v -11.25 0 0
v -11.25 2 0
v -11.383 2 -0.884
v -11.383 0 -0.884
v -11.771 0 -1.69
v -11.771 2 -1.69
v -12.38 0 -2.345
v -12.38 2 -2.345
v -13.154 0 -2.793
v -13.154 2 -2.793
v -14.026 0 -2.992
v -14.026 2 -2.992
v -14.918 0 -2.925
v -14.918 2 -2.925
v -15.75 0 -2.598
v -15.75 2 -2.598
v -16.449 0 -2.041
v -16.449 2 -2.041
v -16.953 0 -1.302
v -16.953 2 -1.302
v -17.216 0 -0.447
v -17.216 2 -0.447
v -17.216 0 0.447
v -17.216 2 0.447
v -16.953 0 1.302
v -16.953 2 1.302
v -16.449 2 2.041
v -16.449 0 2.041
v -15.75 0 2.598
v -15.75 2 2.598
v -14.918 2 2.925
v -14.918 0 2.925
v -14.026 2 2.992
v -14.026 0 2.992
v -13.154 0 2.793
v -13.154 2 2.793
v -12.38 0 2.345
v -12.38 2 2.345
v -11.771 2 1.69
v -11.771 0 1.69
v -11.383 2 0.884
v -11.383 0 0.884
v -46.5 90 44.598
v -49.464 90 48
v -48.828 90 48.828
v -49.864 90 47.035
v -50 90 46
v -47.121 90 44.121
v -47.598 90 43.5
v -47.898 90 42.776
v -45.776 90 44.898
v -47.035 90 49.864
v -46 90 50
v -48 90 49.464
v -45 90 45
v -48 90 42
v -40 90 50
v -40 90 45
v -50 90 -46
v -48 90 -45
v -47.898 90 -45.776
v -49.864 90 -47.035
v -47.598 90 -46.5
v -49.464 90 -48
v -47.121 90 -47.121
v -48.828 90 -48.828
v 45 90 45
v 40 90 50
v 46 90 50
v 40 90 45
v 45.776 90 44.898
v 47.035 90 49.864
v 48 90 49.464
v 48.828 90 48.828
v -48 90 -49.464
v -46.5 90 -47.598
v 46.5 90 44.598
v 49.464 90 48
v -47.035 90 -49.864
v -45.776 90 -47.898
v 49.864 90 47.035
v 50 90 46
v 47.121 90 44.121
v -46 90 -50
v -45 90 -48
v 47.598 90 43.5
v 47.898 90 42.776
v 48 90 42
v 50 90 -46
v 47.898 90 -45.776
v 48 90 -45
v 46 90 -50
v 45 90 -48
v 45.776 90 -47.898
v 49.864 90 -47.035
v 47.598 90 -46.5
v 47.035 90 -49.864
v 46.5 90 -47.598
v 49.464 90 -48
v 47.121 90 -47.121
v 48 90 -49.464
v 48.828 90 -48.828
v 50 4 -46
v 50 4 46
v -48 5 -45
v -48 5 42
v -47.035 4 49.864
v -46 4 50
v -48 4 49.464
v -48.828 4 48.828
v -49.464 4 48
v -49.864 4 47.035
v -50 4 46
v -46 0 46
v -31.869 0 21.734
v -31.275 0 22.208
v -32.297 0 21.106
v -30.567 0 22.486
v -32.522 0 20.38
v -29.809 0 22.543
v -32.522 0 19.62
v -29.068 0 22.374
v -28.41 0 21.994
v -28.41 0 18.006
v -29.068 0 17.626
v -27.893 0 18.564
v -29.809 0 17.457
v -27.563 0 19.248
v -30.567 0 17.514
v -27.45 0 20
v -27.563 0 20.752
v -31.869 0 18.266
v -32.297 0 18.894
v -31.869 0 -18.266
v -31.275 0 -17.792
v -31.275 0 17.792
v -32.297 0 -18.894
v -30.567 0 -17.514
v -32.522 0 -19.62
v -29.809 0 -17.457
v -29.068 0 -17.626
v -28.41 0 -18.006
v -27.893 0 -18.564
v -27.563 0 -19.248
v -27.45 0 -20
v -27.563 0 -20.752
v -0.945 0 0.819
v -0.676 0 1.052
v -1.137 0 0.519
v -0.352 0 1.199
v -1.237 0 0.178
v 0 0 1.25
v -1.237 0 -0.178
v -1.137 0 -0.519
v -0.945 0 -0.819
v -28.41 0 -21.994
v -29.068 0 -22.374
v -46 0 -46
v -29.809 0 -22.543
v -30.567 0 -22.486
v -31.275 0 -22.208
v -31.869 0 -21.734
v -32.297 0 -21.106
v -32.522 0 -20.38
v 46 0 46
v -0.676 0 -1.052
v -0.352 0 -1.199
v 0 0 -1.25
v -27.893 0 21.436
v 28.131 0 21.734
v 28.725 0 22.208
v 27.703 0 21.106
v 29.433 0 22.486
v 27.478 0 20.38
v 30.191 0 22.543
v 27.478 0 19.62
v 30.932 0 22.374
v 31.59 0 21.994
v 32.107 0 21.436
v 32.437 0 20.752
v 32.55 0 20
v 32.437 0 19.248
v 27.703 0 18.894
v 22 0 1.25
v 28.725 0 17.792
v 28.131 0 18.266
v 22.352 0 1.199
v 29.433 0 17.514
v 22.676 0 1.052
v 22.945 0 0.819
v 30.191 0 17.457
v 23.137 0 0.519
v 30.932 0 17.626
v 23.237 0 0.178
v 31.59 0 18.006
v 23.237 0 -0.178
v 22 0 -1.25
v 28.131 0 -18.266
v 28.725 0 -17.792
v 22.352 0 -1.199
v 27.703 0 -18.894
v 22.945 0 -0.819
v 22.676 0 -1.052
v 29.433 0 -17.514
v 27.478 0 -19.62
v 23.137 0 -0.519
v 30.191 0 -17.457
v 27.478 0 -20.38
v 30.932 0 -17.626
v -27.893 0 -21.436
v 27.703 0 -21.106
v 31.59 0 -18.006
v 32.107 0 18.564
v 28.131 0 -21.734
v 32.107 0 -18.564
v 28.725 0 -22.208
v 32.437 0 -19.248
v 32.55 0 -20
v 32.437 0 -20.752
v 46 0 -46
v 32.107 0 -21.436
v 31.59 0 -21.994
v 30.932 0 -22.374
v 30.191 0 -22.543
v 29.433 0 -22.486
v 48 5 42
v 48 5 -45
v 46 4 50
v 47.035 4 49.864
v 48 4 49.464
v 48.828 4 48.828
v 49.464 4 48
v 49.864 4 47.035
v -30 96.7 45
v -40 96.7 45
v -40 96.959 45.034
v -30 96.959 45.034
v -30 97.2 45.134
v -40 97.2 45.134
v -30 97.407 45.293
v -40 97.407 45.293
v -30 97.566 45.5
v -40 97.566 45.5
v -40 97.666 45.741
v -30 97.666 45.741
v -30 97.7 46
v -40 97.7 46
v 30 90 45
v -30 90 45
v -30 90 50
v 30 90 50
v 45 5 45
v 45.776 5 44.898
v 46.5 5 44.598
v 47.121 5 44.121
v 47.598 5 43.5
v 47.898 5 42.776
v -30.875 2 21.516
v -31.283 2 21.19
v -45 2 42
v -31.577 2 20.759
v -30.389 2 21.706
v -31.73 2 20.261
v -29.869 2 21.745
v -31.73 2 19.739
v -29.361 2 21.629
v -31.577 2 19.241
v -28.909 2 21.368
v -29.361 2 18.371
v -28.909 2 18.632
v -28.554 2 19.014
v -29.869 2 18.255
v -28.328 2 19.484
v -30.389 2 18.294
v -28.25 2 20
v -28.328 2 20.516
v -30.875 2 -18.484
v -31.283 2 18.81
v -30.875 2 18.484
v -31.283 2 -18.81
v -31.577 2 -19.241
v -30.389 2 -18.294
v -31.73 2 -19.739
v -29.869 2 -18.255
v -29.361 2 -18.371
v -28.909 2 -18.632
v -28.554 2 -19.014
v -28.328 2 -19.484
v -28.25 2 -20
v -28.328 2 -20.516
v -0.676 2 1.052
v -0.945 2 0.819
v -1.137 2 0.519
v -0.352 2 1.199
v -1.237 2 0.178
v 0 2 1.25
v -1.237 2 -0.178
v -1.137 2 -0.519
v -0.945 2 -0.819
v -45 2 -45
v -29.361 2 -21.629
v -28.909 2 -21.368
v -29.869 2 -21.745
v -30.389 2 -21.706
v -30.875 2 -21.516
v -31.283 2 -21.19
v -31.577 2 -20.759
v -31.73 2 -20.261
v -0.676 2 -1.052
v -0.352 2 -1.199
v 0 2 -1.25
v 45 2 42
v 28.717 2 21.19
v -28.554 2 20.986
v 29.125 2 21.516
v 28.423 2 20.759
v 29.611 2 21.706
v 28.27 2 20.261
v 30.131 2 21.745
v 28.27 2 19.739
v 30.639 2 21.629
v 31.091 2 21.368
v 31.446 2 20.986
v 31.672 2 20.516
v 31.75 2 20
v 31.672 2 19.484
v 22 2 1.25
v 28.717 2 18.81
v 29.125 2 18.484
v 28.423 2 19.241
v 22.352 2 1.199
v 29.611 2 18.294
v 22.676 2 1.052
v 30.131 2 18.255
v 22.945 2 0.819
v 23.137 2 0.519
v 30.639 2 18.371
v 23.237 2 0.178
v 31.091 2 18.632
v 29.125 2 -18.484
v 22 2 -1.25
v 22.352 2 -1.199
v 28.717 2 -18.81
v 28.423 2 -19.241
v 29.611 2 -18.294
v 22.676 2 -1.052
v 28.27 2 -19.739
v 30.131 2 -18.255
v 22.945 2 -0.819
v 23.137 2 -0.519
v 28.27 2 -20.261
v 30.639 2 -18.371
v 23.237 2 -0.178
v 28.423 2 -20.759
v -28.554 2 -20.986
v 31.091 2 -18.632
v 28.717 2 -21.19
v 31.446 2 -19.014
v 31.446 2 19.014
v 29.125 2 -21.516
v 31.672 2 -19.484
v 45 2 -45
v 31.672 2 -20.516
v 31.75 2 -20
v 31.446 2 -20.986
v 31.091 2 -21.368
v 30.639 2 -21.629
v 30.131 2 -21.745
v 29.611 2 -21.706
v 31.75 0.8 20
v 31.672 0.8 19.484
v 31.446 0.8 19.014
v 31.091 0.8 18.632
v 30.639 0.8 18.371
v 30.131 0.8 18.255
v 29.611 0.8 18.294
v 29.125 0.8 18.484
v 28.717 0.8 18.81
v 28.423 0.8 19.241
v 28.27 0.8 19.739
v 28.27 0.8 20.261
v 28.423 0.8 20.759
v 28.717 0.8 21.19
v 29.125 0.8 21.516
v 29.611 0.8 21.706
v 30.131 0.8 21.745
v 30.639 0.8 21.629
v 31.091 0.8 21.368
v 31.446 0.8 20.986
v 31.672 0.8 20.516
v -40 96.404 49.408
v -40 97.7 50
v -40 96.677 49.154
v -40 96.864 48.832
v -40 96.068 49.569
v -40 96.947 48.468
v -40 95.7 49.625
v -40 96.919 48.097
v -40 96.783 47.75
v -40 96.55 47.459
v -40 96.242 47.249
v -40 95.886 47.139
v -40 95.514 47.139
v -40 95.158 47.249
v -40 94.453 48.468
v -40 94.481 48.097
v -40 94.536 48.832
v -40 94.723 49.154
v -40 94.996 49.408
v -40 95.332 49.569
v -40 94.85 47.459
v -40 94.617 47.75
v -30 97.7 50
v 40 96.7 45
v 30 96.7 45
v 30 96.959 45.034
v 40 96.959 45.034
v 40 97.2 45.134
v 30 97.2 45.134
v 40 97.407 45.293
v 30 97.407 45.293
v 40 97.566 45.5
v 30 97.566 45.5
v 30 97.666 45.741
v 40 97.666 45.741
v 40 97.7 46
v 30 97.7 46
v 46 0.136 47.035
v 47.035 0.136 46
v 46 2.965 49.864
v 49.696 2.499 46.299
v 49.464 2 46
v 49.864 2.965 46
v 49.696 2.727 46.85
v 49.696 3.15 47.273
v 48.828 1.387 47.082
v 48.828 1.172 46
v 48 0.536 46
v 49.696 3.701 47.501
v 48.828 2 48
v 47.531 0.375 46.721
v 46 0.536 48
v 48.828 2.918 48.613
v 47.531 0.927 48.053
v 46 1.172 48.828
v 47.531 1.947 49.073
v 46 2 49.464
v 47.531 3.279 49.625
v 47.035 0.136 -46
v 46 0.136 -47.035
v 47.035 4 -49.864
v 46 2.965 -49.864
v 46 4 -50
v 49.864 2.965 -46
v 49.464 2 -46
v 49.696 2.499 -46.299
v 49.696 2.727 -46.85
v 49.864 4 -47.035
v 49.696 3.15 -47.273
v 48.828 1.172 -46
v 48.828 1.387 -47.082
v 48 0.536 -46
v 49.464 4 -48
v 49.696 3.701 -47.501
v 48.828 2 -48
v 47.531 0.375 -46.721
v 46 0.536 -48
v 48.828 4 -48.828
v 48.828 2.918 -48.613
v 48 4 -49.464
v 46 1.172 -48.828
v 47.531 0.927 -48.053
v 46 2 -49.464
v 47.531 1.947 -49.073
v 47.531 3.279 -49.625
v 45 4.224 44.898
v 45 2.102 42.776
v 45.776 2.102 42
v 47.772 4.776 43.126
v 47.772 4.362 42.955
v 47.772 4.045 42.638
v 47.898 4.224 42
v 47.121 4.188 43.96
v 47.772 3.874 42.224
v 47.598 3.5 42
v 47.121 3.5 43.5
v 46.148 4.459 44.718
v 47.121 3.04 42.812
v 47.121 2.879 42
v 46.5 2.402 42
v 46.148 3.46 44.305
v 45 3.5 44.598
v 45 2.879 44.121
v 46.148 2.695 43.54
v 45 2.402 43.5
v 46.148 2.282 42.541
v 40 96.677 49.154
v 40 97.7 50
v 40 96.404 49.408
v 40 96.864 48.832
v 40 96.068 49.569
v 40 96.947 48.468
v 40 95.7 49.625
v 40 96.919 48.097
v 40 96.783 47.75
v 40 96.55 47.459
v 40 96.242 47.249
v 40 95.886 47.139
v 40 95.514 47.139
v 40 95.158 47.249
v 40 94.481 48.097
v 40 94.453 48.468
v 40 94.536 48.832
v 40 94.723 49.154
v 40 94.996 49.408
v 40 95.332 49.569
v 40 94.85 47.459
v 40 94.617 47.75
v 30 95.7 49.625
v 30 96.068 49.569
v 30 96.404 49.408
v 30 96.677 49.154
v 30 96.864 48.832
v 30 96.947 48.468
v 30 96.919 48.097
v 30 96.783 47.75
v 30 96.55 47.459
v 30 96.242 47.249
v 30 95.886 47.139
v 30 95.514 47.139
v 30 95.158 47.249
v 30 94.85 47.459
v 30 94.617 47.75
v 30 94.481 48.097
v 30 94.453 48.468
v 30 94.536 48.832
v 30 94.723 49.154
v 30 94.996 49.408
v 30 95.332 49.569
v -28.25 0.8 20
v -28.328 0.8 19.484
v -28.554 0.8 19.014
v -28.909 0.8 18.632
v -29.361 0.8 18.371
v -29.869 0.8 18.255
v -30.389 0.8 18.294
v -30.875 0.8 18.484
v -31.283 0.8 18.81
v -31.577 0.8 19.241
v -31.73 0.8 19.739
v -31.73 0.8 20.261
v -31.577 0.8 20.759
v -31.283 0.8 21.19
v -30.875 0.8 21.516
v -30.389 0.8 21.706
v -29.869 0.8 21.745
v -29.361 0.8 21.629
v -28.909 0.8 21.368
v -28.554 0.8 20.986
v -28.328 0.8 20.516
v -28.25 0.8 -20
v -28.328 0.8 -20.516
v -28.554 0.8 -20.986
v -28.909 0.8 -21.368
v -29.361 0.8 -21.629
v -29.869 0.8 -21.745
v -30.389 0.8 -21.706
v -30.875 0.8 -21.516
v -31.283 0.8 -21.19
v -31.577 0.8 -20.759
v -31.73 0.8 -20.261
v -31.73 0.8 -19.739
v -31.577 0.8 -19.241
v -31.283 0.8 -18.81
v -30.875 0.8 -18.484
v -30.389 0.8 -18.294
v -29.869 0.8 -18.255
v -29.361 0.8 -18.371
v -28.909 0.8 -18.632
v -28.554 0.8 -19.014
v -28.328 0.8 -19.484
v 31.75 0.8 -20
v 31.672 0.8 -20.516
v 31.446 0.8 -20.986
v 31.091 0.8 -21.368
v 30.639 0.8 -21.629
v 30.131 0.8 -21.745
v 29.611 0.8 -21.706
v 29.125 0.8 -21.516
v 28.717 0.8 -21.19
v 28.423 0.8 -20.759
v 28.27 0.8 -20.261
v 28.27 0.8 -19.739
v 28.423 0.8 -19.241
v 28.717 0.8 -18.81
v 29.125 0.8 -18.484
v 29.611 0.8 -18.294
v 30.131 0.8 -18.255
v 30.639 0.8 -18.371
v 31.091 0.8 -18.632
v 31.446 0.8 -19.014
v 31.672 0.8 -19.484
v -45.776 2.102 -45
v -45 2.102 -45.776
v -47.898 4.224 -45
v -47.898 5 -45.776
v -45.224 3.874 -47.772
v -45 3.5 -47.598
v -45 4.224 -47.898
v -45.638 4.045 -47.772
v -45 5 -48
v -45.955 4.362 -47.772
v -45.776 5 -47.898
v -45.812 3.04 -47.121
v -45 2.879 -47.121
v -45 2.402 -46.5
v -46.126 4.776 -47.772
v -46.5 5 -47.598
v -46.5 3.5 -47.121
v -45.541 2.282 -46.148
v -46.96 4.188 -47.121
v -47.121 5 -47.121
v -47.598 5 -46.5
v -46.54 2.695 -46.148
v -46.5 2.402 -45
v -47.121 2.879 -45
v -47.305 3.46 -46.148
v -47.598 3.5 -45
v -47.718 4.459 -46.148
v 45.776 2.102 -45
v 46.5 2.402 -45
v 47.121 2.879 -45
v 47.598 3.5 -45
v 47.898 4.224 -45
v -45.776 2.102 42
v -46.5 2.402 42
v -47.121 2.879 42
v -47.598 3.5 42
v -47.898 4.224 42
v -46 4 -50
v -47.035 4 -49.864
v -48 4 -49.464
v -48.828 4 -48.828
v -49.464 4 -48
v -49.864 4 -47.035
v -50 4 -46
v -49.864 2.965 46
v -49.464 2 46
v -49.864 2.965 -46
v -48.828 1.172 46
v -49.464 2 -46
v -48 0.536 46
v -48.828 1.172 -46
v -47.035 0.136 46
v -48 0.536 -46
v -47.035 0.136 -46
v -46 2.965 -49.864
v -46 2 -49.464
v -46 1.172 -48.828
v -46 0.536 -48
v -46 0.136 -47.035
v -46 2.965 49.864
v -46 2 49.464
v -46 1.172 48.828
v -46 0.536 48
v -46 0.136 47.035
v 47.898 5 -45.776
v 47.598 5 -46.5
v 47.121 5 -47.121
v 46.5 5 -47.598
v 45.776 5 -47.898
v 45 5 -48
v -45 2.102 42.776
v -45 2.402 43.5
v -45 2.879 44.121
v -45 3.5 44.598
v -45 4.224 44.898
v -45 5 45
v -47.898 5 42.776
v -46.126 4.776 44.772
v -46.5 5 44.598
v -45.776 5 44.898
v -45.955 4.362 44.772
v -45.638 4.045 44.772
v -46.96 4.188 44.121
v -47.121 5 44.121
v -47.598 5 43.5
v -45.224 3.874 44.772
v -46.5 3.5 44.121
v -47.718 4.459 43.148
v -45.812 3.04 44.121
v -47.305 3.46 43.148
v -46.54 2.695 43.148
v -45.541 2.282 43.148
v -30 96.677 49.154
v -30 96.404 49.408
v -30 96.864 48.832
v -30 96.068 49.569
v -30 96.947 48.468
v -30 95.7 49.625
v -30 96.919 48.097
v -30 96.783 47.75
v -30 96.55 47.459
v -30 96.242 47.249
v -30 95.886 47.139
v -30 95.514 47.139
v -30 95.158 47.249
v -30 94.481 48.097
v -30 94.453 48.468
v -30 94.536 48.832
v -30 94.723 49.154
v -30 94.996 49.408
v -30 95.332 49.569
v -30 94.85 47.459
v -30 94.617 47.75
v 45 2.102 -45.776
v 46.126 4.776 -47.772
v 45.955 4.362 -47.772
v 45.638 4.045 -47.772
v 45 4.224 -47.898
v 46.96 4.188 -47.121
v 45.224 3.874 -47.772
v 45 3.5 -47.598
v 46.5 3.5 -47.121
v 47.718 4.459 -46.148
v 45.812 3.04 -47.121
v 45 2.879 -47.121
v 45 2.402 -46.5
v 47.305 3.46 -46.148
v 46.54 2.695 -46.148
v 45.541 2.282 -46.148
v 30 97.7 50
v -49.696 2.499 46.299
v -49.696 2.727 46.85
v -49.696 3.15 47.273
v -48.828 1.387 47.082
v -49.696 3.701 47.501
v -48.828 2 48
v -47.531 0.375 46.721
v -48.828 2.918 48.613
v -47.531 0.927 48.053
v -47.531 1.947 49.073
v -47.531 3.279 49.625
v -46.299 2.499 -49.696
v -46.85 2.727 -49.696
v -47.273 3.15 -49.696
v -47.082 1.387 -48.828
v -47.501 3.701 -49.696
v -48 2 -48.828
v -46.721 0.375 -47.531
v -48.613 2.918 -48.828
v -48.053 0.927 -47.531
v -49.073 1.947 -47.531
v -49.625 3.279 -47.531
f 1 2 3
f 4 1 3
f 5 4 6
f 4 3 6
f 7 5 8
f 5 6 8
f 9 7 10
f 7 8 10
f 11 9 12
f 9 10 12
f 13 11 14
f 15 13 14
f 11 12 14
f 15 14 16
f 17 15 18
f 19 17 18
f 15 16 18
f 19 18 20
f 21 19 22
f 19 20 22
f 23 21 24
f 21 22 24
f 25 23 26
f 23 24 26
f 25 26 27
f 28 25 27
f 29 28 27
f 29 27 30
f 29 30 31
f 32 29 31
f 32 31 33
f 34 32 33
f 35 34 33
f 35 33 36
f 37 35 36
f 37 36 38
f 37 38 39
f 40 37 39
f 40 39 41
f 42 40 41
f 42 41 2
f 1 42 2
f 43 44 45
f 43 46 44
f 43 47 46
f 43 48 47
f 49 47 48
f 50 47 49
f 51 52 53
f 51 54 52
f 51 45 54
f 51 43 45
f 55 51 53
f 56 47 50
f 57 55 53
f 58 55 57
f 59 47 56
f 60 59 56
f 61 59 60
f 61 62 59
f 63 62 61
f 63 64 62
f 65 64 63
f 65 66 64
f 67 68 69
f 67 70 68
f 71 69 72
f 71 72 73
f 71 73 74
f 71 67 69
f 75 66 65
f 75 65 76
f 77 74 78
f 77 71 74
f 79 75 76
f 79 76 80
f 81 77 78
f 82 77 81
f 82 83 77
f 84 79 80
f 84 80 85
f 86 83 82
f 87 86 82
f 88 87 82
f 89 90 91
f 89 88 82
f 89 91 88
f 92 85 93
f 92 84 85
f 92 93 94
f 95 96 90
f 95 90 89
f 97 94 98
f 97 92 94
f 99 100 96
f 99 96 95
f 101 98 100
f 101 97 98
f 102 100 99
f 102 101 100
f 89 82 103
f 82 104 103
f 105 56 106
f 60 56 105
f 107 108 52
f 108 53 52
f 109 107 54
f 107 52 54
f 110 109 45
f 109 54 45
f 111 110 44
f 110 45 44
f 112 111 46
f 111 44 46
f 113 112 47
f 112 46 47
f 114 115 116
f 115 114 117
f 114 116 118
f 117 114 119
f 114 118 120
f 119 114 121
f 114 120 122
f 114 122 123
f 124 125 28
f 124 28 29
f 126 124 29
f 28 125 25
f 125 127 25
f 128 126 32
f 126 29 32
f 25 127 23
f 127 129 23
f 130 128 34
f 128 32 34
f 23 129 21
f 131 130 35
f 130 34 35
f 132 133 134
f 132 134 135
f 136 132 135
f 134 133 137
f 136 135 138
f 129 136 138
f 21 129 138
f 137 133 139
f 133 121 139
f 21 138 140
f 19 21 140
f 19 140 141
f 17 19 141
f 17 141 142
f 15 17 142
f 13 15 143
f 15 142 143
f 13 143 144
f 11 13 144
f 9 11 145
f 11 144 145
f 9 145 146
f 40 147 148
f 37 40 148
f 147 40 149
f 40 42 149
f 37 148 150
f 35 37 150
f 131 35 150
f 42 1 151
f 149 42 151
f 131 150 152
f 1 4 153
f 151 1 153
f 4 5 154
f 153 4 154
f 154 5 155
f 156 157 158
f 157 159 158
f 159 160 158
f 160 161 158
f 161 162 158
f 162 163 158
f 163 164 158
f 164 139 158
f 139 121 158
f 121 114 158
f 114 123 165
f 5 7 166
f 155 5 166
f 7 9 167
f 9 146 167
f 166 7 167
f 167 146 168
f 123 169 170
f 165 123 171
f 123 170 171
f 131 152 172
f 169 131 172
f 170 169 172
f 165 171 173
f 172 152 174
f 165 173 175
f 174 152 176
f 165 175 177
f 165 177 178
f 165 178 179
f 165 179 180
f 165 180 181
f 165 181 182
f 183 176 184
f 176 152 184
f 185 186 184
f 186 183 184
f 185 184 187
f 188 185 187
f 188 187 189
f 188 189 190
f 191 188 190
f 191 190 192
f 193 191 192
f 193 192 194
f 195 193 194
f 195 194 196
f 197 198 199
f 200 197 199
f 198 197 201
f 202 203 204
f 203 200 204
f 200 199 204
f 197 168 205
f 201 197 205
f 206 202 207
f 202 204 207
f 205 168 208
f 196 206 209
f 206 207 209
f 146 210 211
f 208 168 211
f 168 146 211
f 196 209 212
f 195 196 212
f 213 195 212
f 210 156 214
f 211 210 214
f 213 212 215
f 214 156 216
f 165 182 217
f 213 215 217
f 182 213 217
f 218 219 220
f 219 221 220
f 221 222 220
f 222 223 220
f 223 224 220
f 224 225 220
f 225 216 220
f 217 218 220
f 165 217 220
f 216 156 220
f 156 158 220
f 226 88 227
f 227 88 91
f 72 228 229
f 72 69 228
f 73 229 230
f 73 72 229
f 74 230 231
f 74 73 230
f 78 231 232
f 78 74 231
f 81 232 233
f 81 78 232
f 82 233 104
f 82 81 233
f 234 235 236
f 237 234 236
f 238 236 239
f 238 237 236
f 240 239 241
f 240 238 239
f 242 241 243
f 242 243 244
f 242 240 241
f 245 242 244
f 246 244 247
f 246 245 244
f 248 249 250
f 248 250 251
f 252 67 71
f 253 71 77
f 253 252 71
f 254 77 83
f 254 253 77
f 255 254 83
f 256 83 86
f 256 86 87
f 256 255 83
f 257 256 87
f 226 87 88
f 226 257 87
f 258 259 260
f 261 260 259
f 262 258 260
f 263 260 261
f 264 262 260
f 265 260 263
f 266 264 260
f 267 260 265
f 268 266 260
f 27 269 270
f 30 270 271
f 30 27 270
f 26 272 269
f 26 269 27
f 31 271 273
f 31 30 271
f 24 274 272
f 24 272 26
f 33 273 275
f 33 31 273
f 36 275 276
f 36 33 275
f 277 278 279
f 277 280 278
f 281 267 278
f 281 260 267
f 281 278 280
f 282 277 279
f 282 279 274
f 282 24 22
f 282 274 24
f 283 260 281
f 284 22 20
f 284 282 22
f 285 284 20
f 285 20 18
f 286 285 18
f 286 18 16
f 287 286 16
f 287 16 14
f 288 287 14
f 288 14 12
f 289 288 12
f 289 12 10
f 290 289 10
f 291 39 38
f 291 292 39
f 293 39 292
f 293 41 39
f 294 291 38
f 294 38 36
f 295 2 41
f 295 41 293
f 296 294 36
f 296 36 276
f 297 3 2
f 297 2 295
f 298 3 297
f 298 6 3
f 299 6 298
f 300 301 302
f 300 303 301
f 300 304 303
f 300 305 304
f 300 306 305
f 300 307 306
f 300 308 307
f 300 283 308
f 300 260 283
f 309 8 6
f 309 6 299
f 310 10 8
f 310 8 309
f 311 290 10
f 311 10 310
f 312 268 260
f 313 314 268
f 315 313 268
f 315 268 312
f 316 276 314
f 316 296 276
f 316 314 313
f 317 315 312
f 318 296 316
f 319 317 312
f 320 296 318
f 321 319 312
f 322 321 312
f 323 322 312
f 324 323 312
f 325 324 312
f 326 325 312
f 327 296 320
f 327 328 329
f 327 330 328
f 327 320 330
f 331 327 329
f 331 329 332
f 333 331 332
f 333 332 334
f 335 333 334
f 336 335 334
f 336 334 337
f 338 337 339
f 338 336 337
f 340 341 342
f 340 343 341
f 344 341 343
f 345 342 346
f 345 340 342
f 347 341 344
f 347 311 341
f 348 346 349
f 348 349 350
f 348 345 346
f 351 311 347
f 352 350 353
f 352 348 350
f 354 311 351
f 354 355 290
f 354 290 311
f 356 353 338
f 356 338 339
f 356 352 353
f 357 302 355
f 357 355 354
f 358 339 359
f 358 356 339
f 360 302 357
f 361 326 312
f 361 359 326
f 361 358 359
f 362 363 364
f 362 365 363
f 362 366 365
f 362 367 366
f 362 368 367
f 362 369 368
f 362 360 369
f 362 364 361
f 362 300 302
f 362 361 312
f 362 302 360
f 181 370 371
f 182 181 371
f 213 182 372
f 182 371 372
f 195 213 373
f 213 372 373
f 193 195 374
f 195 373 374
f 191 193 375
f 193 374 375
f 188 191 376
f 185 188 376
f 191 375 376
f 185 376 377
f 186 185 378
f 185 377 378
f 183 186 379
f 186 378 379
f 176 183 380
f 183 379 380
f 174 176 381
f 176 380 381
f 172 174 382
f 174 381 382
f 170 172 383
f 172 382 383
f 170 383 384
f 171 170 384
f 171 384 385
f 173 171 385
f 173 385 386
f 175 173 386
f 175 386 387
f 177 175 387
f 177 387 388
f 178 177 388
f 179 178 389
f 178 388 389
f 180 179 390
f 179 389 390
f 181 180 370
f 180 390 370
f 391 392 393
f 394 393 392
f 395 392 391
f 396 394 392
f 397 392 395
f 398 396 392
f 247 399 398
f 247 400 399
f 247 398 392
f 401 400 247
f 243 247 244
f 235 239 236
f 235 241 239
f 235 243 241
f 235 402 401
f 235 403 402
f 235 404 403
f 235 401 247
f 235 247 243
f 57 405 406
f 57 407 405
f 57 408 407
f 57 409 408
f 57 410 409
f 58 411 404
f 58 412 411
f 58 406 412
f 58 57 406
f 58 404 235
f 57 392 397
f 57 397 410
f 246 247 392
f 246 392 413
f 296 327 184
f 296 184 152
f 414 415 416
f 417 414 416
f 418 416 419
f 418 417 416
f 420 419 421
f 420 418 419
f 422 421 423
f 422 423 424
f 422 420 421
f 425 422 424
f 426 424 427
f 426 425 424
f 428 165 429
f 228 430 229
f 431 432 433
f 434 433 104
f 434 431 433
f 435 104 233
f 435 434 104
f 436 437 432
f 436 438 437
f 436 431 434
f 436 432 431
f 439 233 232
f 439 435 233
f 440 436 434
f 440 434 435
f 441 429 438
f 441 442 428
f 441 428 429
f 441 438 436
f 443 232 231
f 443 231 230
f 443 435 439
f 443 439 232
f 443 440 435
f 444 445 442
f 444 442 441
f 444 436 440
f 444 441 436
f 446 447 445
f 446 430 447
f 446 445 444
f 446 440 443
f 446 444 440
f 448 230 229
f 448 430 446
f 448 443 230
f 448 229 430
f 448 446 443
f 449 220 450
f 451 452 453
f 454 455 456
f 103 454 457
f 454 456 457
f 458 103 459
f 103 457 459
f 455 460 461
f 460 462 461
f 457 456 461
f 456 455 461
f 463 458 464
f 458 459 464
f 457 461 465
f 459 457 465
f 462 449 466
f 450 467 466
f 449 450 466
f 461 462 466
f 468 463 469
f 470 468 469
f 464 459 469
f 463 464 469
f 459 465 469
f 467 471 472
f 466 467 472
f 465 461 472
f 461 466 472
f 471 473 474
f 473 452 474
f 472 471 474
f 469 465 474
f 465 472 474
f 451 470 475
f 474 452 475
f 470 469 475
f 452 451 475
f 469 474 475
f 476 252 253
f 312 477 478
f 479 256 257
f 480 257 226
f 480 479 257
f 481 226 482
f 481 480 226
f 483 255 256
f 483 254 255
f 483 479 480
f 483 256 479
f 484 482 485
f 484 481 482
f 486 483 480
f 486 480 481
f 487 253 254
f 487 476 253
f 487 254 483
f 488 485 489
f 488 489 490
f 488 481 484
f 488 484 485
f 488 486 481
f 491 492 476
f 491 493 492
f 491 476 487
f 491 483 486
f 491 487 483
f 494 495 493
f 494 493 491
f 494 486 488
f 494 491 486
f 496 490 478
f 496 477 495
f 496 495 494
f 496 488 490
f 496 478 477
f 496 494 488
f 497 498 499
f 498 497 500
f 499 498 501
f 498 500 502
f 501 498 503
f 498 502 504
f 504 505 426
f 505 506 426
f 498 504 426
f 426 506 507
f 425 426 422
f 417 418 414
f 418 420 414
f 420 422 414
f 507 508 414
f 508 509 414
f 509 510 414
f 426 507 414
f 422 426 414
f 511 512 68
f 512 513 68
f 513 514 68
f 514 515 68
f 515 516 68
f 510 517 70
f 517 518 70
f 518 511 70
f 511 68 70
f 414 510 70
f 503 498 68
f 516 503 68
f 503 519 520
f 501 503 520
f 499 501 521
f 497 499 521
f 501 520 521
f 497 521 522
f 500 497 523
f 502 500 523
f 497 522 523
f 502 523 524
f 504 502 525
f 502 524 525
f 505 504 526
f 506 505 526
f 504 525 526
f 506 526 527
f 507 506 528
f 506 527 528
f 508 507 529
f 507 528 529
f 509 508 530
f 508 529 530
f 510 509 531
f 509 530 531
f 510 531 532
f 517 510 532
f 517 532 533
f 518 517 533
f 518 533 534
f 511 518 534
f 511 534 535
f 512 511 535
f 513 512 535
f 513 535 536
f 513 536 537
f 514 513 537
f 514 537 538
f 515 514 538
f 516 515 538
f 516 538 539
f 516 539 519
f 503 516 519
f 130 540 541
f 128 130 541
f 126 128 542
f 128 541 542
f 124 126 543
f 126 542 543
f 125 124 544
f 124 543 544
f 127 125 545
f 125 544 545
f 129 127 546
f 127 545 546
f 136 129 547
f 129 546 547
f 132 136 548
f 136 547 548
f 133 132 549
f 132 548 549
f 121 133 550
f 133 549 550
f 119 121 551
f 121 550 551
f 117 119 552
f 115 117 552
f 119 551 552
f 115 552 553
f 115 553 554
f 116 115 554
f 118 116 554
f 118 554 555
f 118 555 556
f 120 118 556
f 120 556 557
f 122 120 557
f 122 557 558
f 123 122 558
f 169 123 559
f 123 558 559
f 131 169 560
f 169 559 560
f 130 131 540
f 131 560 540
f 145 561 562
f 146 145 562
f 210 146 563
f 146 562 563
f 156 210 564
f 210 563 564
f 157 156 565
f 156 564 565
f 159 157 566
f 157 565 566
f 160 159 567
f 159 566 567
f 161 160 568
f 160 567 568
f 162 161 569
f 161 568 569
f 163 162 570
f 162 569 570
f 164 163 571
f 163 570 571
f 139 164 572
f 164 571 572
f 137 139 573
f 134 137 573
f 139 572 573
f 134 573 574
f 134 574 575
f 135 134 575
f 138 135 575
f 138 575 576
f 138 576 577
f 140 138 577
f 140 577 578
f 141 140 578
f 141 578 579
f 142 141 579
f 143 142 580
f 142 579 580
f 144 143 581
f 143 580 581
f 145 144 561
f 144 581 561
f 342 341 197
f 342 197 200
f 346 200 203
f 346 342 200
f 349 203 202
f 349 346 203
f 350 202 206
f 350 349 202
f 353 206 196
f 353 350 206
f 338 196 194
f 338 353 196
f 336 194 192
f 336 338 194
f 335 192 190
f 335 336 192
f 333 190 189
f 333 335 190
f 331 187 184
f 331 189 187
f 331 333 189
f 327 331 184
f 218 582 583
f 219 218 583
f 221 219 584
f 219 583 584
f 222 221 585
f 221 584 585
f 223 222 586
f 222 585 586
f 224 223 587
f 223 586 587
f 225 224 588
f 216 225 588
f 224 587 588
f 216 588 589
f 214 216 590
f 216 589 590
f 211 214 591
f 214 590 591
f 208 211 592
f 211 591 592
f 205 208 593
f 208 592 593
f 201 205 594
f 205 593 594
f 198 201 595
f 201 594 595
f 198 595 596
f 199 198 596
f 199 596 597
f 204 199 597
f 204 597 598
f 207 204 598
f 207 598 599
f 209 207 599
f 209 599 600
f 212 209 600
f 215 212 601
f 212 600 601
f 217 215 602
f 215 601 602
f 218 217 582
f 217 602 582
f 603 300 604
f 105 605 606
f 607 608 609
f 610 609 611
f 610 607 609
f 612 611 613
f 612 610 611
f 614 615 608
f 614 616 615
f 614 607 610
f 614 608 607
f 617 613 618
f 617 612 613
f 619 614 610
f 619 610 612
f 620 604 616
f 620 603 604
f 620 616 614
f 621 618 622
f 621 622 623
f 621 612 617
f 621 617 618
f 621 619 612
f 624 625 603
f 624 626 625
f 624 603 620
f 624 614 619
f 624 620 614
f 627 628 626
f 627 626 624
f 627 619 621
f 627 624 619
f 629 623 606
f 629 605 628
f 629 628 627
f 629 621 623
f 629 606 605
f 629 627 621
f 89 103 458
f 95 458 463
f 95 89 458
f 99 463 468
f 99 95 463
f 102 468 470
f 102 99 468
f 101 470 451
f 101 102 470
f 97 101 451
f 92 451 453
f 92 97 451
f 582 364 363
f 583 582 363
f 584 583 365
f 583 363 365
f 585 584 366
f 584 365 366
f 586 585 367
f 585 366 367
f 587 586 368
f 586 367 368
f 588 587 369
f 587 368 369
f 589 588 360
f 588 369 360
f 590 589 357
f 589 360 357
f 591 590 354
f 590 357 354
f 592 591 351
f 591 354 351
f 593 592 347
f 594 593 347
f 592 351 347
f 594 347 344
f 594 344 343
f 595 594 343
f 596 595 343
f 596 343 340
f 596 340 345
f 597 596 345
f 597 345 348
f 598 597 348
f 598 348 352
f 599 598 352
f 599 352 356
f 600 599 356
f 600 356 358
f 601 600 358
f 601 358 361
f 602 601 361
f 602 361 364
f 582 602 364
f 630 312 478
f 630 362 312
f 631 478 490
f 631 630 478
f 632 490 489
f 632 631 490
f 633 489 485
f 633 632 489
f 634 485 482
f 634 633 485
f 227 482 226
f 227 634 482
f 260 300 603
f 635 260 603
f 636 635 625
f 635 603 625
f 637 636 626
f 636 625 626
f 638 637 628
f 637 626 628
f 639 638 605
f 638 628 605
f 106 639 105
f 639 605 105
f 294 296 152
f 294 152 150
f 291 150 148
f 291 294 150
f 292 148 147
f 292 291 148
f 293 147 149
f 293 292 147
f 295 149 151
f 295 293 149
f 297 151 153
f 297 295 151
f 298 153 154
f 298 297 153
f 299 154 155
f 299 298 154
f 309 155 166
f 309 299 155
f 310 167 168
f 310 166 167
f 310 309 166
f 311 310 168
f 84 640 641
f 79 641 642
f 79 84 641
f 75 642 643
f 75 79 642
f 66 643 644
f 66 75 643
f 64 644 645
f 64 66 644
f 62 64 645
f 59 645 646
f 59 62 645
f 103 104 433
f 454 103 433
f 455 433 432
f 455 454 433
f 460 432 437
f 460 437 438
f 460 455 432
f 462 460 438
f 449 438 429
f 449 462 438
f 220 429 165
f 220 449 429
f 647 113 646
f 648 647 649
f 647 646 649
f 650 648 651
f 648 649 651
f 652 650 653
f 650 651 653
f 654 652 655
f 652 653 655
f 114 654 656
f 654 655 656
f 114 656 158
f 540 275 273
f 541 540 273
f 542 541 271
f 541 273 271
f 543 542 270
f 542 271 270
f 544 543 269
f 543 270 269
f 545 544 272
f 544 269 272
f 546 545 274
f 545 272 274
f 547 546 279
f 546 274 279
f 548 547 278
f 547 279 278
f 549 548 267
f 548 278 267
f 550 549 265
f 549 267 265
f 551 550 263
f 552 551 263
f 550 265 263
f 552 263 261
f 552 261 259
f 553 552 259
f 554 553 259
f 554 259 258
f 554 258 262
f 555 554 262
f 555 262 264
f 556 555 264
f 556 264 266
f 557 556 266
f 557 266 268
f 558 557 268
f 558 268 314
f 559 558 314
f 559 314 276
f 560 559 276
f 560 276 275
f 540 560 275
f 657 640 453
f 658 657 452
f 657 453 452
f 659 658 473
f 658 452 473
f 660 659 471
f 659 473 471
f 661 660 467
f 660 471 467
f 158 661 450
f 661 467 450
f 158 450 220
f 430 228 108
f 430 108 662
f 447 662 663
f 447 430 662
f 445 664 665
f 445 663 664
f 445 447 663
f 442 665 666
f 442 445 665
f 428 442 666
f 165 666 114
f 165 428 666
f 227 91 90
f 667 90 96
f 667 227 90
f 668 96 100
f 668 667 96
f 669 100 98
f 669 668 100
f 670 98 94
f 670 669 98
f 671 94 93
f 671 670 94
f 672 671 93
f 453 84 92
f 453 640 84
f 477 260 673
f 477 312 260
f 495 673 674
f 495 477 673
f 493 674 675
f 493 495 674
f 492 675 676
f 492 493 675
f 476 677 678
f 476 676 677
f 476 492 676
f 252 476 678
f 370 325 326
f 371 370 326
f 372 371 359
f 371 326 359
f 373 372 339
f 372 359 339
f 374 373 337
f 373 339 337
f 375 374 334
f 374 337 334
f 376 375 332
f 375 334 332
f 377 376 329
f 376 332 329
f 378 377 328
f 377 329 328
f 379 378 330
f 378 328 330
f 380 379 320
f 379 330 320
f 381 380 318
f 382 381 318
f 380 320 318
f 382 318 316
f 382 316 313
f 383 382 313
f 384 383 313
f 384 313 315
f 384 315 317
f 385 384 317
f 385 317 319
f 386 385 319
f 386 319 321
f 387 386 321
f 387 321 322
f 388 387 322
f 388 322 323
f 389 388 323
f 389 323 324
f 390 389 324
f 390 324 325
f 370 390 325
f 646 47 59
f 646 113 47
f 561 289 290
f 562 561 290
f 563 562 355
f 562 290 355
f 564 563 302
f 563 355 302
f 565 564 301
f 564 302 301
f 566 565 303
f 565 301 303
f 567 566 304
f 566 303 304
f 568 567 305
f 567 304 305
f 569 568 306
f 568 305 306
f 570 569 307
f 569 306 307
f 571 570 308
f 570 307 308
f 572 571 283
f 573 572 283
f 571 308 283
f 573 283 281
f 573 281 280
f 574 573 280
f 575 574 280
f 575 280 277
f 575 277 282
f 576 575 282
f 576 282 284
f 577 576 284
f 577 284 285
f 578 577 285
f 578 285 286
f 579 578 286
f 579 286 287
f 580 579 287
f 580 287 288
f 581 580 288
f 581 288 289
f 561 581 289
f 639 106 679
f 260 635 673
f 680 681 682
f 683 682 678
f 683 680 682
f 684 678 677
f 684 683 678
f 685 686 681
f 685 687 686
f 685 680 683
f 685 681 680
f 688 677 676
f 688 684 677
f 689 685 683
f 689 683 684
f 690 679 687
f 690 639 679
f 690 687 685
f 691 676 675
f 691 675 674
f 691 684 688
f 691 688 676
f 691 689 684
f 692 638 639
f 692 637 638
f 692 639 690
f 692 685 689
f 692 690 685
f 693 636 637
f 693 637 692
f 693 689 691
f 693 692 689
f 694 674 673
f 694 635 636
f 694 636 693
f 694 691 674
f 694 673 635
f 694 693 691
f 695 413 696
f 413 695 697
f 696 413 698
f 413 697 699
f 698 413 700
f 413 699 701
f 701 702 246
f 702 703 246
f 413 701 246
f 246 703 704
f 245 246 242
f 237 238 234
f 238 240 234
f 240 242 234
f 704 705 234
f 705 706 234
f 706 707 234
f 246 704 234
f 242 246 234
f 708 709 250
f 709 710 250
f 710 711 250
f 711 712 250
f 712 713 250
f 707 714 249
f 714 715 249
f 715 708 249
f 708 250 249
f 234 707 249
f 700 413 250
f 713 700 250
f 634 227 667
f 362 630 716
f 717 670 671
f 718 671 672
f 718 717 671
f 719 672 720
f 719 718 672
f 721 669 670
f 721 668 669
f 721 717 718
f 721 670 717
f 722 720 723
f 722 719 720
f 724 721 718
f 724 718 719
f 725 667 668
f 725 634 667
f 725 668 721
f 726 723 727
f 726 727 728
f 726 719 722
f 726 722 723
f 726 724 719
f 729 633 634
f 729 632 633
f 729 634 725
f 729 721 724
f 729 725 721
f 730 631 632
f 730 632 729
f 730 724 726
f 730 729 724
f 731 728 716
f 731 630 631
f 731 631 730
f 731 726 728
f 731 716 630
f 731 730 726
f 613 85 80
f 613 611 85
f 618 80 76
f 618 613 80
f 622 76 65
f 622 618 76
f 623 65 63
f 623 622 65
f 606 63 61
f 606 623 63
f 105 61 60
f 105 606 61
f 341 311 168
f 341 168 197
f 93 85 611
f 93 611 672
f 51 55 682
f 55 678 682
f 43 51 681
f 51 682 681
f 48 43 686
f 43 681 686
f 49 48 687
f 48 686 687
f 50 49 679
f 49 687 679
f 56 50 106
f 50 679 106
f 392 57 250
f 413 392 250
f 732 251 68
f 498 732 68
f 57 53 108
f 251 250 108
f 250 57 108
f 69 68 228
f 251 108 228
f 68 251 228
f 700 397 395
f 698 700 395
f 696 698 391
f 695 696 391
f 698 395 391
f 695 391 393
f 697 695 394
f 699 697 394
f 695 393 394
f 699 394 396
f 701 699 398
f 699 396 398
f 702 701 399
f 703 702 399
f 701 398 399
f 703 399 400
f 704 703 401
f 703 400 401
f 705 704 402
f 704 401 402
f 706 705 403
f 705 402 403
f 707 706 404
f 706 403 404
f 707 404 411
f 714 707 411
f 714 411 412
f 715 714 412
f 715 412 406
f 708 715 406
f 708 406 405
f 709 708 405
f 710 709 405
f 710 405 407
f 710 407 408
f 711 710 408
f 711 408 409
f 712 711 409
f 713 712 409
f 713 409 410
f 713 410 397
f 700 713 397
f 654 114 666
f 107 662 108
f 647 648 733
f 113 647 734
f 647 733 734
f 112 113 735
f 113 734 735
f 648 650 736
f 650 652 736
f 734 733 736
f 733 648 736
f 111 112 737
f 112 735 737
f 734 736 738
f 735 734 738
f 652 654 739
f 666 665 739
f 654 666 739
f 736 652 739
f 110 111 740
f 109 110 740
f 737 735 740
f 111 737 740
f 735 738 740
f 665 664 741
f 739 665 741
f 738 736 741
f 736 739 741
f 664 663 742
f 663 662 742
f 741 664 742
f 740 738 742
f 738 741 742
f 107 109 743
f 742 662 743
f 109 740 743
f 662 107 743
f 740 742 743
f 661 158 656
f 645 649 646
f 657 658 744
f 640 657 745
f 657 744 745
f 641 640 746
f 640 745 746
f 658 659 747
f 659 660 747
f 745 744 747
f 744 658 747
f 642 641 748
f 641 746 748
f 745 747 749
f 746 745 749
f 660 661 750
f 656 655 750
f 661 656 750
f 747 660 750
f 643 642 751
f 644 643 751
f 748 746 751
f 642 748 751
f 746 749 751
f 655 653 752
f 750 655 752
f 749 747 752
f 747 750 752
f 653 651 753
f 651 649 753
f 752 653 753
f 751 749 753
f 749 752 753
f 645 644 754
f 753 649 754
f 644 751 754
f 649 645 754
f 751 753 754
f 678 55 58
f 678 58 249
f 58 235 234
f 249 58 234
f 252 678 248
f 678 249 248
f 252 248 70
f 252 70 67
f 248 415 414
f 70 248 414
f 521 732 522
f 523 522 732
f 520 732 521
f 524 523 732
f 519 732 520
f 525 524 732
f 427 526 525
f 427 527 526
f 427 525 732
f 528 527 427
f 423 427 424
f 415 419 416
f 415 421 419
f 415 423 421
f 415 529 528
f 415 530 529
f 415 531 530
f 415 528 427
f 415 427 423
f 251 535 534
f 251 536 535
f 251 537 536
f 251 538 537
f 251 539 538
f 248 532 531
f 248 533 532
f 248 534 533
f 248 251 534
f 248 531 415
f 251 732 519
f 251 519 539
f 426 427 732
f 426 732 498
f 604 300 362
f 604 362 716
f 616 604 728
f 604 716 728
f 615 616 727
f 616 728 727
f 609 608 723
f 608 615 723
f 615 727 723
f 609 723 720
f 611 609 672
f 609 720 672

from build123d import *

# Parameters (mm, degrees)
SKETCH1_W           = 100
SKETCH1_H           = 100
BOSS_EXTRUDE1_DEPTH = 90
SKETCH2_W           = 96
SKETCH2_H           = 93
CUT_EXTRUDE1_DEPTH  = 88
CUT_EXTRUDE2_REACH  = 4
SKETCH3_R           = 3
SKETCH3_R_2         = 1.75
CHAMFER1_SIZE       = 0.8
SKETCH4_W           = 10
SKETCH4_H           = 5
BOSS_EXTRUDE2_DEPTH = 7.7
SKETCH5_R           = 1.25
CUT_EXTRUDE3_DEPTH  = 91
FILLET1_R           = 3
FILLET2_R           = 4
FILLET3_R           = 1


with BuildPart() as part:
    # Sketch1 → Boss-Extrude1 (new body)
    with BuildSketch(Plane(origin=(0, 0, 0), x_dir=(1, 0, 0), z_dir=(0, 1, 0))):
        Rectangle(SKETCH1_W, SKETCH1_H)
    extrude(amount=BOSS_EXTRUDE1_DEPTH)

    # Sketch2 → Cut-Extrude1 (cut)
    with BuildSketch(Plane(origin=(0, 90, 0), x_dir=(1, 0, 0), z_dir=(0, 1, 0))):
        with Locations((0, 1.5)):
            Rectangle(SKETCH2_W, SKETCH2_H)
    extrude(amount=-CUT_EXTRUDE1_DEPTH, mode=Mode.SUBTRACT)

    # Sketch3 → Cut-Extrude2 (cut, up to next)
    with BuildSketch(Plane(origin=(0, 2, 0), x_dir=(1, 0, 0), z_dir=(0, 1, 0)), mode=Mode.PRIVATE) as cut_extrude2_sk1:
        with Locations((-14.25, 0)):
            Circle(SKETCH3_R)
    cut_extrude2_tool1 = extrude(cut_extrude2_sk1.sketch, amount=-CUT_EXTRUDE2_REACH, mode=Mode.PRIVATE) & part.part
    add(cut_extrude2_tool1.solids().sort_by_distance((-14.25, 2, 0))[0], mode=Mode.SUBTRACT)
    # Sketch3 → Cut-Extrude2 (cut, up to next)
    with BuildSketch(Plane(origin=(0, 2, 0), x_dir=(1, 0, 0), z_dir=(0, 1, 0)), mode=Mode.PRIVATE) as cut_extrude2_sk2:
        with Locations((-30, 20)):
            Circle(SKETCH3_R_2)
    cut_extrude2_tool2 = extrude(cut_extrude2_sk2.sketch, amount=-CUT_EXTRUDE2_REACH, mode=Mode.PRIVATE) & part.part
    add(cut_extrude2_tool2.solids().sort_by_distance((-30, 2, -20))[0], mode=Mode.SUBTRACT)
    # Sketch3 → Cut-Extrude2 (cut, up to next)
    with BuildSketch(Plane(origin=(0, 2, 0), x_dir=(1, 0, 0), z_dir=(0, 1, 0)), mode=Mode.PRIVATE) as cut_extrude2_sk3:
        with Locations((-30, -20)):
            Circle(SKETCH3_R_2)
    cut_extrude2_tool3 = extrude(cut_extrude2_sk3.sketch, amount=-CUT_EXTRUDE2_REACH, mode=Mode.PRIVATE) & part.part
    add(cut_extrude2_tool3.solids().sort_by_distance((-30, 2, 20))[0], mode=Mode.SUBTRACT)
    # Sketch3 → Cut-Extrude2 (cut, up to next)
    with BuildSketch(Plane(origin=(0, 2, 0), x_dir=(1, 0, 0), z_dir=(0, 1, 0)), mode=Mode.PRIVATE) as cut_extrude2_sk4:
        with Locations((30, -20)):
            Circle(SKETCH3_R_2)
    cut_extrude2_tool4 = extrude(cut_extrude2_sk4.sketch, amount=-CUT_EXTRUDE2_REACH, mode=Mode.PRIVATE) & part.part
    add(cut_extrude2_tool4.solids().sort_by_distance((30, 2, 20))[0], mode=Mode.SUBTRACT)
    # Sketch3 → Cut-Extrude2 (cut, up to next)
    with BuildSketch(Plane(origin=(0, 2, 0), x_dir=(1, 0, 0), z_dir=(0, 1, 0)), mode=Mode.PRIVATE) as cut_extrude2_sk5:
        with Locations((30, 20)):
            Circle(SKETCH3_R_2)
    cut_extrude2_tool5 = extrude(cut_extrude2_sk5.sketch, amount=-CUT_EXTRUDE2_REACH, mode=Mode.PRIVATE) & part.part
    add(cut_extrude2_tool5.solids().sort_by_distance((30, 2, -20))[0], mode=Mode.SUBTRACT)
    # Sketch3 → Cut-Extrude2 (cut, up to next)
    with BuildSketch(Plane(origin=(0, 2, 0), x_dir=(1, 0, 0), z_dir=(0, 1, 0)), mode=Mode.PRIVATE) as cut_extrude2_sk6:
        with BuildLine():
            Line((0, 1.25), (22, 1.25))
            ThreePointArc((22, 1.25), (23.25, 0), (22, -1.25))
            Line((22, -1.25), (0, -1.25))
            ThreePointArc((0, -1.25), (-1.25, 0), (0, 1.25))
        make_face()
    cut_extrude2_tool6 = extrude(cut_extrude2_sk6.sketch, amount=-CUT_EXTRUDE2_REACH, mode=Mode.PRIVATE) & part.part
    add(cut_extrude2_tool6.solids().sort_by_distance((11, 2, 0))[0], mode=Mode.SUBTRACT)

    # Chamfer1
    chamfer1_edges = [part.edges().sort_by_distance(p)[0] for p in [
        (-31.75, 0, -20),
        (-31.75, 0, 20),
        (28.25, 0, 20),
        (28.25, 0, -20),
    ]]
    chamfer(chamfer1_edges, length=CHAMFER1_SIZE)

    # Sketch4 → Boss-Extrude2 (add)
    with BuildSketch(Plane(origin=(0, 90, 0), x_dir=(1, 0, 0), z_dir=(0, 1, 0))):
        with Locations((-35, -47.5)):
            Rectangle(SKETCH4_W, SKETCH4_H)
        with Locations((35, -47.5)):
            Rectangle(SKETCH4_W, SKETCH4_H)
    extrude(amount=BOSS_EXTRUDE2_DEPTH)

    # Sketch5 → Cut-Extrude3 (cut, through all)
    with BuildSketch(Plane.ZY.offset(40)):
        with Locations((48.375, 95.7)):
            Circle(SKETCH5_R)
    extrude(amount=-CUT_EXTRUDE3_DEPTH, mode=Mode.SUBTRACT)

    # Fillet1
    fillet1_edges = [part.edges().sort_by_distance(p)[0] for p in [
        (-48, 2, -1.5),
        (-48, 46, 45),
        (0, 2, 45),
        (48, 46, 45),
        (48, 2, -1.5),
        (48, 46, -48),
        (0, 2, -48),
        (-48, 46, -48),
    ]]
    fillet(fillet1_edges, radius=FILLET1_R)

    # Fillet2
    fillet2_edges = [part.edges().sort_by_distance(p)[0] for p in [
        (0, 0, 50),
        (-50, 0, 0),
        (0, 0, -50),
        (50, 0, 0),
        (50, 45, 50),
        (-50, 45, 50),
        (-50, 45, -50),
        (50, 45, -50),
    ]]
    fillet(fillet2_edges, radius=FILLET2_R)

    # Fillet3
    fillet3_edges = [part.edges().sort_by_distance(p)[0] for p in [
        (-35, 97.7, 45),
        (35, 97.7, 45),
    ]]
    fillet(fillet3_edges, radius=FILLET3_R)


solid = part.part
